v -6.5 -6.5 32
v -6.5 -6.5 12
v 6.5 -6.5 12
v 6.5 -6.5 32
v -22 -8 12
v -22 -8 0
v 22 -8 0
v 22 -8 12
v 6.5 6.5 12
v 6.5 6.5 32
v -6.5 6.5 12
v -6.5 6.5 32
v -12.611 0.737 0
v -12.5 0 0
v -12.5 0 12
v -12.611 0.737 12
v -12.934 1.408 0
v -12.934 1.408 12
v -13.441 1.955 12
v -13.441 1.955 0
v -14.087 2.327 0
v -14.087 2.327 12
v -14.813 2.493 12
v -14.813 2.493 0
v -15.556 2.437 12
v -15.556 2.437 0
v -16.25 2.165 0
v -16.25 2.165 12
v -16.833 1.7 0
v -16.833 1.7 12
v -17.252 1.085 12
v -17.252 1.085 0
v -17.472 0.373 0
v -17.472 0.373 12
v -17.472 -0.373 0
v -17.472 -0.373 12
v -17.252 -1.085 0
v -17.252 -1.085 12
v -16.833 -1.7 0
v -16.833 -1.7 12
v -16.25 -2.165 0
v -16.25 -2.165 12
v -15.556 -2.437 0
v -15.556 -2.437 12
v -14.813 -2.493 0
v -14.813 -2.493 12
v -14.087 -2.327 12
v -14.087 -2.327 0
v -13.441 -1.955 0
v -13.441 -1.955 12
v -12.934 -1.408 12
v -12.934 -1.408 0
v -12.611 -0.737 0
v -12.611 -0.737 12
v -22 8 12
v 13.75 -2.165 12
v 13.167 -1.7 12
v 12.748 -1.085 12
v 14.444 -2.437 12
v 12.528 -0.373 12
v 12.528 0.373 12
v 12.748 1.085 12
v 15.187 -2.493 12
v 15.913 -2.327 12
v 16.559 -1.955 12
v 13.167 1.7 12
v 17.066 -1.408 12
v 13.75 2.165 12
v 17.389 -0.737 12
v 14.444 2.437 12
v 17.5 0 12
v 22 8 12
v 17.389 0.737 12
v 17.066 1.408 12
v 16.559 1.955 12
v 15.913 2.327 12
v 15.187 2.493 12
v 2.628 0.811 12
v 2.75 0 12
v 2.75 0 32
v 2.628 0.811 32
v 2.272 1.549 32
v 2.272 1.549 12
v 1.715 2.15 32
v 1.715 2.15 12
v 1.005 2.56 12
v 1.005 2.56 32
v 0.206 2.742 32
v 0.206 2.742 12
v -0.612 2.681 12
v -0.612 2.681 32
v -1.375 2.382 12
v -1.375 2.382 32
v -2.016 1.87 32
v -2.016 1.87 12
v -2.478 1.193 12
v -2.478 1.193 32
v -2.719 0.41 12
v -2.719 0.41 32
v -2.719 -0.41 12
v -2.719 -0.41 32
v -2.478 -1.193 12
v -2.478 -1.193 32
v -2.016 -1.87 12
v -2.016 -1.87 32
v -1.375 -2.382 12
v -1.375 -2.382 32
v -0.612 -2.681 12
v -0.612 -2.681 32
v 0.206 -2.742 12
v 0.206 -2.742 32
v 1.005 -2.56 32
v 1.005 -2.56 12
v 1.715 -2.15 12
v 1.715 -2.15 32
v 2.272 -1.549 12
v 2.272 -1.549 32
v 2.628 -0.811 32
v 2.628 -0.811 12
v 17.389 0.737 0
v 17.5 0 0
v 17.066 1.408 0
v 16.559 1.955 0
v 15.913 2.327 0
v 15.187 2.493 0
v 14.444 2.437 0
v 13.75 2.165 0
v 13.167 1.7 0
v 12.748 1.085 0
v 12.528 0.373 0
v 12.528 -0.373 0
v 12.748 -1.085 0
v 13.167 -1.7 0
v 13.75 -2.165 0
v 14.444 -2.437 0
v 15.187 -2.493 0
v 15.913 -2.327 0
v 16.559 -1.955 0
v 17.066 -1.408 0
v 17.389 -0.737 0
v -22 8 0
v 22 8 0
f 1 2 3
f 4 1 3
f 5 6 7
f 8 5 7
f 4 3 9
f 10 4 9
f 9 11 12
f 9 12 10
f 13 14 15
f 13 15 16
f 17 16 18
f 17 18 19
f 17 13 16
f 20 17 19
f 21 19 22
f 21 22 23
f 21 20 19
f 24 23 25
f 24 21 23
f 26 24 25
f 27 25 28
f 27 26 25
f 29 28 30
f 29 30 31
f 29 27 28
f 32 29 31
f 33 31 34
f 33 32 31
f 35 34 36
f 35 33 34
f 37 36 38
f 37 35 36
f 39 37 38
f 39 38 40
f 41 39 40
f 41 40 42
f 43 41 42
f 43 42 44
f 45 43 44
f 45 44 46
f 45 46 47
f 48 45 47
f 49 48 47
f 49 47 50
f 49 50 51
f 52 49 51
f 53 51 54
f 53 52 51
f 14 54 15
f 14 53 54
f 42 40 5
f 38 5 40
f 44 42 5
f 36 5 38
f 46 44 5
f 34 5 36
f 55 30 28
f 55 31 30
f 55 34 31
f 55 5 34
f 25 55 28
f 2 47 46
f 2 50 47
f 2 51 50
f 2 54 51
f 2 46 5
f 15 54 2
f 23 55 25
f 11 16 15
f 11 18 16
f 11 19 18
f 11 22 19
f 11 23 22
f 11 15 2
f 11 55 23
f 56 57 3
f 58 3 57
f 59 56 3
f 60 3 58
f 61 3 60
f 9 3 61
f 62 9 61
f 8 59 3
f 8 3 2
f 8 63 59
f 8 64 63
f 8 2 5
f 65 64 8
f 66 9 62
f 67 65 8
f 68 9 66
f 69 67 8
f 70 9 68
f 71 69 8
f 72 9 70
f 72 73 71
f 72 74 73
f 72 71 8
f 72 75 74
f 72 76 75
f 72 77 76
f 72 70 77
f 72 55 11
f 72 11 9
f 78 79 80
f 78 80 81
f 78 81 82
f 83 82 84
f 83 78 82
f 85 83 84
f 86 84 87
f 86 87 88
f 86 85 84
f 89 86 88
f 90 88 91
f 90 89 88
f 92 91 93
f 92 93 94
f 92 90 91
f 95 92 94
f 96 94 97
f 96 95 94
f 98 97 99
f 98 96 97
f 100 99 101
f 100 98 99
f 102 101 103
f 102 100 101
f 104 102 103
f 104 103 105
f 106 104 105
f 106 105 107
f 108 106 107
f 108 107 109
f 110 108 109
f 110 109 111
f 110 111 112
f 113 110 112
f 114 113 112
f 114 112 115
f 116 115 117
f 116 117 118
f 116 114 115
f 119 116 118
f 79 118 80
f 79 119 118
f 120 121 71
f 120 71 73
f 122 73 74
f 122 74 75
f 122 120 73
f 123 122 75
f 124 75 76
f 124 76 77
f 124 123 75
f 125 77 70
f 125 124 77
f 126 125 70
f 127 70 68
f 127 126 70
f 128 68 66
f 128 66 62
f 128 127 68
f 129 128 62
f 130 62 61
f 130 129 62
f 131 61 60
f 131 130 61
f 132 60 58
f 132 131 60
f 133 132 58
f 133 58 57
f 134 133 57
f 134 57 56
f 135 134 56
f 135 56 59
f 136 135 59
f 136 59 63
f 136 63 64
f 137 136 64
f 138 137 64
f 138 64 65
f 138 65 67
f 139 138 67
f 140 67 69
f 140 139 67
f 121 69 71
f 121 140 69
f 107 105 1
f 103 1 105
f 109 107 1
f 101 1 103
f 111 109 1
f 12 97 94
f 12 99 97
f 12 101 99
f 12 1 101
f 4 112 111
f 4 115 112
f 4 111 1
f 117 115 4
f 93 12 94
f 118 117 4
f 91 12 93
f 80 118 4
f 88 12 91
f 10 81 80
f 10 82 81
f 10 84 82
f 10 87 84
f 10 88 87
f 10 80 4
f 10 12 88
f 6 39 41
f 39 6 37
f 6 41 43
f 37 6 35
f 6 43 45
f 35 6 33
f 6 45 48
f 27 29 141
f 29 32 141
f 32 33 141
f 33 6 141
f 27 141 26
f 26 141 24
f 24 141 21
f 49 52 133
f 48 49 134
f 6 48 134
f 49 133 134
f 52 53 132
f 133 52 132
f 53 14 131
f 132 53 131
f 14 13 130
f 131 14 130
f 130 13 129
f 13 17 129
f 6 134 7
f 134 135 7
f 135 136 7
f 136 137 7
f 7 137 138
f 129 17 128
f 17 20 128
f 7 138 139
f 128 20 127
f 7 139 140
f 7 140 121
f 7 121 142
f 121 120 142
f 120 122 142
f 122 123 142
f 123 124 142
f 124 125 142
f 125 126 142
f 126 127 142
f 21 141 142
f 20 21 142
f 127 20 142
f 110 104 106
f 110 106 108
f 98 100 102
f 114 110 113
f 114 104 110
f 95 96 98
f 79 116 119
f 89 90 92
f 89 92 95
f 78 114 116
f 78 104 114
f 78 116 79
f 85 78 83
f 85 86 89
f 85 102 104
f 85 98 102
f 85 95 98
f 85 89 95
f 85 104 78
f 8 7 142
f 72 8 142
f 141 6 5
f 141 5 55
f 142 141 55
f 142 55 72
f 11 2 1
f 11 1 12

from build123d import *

# Parameters (mm, degrees)
F0_W     = 44
F0_H     = 16
F0_R     = 2.5
F1_DEPTH = 12
F2_W     = 13
F2_H     = 13
F2_R     = 2.75
F3_DEPTH = 20


with BuildPart() as f1:
    # F0 (on Top) → F1 (new body)
    with BuildSketch(Plane.XY):
        Rectangle(F0_W, F0_H)
        with Locations((-15, 0)):
            Circle(F0_R, mode=Mode.SUBTRACT)
        with Locations((15, 0)):
            Circle(F0_R, mode=Mode.SUBTRACT)
    extrude(amount=F1_DEPTH)

    # F2 (on face) → F3 (join)
    with BuildSketch(Plane.XY.offset(12)):
        Rectangle(F2_W, F2_H)
        Circle(F2_R, mode=Mode.SUBTRACT)
    extrude(amount=F3_DEPTH)


solid = f1.part
